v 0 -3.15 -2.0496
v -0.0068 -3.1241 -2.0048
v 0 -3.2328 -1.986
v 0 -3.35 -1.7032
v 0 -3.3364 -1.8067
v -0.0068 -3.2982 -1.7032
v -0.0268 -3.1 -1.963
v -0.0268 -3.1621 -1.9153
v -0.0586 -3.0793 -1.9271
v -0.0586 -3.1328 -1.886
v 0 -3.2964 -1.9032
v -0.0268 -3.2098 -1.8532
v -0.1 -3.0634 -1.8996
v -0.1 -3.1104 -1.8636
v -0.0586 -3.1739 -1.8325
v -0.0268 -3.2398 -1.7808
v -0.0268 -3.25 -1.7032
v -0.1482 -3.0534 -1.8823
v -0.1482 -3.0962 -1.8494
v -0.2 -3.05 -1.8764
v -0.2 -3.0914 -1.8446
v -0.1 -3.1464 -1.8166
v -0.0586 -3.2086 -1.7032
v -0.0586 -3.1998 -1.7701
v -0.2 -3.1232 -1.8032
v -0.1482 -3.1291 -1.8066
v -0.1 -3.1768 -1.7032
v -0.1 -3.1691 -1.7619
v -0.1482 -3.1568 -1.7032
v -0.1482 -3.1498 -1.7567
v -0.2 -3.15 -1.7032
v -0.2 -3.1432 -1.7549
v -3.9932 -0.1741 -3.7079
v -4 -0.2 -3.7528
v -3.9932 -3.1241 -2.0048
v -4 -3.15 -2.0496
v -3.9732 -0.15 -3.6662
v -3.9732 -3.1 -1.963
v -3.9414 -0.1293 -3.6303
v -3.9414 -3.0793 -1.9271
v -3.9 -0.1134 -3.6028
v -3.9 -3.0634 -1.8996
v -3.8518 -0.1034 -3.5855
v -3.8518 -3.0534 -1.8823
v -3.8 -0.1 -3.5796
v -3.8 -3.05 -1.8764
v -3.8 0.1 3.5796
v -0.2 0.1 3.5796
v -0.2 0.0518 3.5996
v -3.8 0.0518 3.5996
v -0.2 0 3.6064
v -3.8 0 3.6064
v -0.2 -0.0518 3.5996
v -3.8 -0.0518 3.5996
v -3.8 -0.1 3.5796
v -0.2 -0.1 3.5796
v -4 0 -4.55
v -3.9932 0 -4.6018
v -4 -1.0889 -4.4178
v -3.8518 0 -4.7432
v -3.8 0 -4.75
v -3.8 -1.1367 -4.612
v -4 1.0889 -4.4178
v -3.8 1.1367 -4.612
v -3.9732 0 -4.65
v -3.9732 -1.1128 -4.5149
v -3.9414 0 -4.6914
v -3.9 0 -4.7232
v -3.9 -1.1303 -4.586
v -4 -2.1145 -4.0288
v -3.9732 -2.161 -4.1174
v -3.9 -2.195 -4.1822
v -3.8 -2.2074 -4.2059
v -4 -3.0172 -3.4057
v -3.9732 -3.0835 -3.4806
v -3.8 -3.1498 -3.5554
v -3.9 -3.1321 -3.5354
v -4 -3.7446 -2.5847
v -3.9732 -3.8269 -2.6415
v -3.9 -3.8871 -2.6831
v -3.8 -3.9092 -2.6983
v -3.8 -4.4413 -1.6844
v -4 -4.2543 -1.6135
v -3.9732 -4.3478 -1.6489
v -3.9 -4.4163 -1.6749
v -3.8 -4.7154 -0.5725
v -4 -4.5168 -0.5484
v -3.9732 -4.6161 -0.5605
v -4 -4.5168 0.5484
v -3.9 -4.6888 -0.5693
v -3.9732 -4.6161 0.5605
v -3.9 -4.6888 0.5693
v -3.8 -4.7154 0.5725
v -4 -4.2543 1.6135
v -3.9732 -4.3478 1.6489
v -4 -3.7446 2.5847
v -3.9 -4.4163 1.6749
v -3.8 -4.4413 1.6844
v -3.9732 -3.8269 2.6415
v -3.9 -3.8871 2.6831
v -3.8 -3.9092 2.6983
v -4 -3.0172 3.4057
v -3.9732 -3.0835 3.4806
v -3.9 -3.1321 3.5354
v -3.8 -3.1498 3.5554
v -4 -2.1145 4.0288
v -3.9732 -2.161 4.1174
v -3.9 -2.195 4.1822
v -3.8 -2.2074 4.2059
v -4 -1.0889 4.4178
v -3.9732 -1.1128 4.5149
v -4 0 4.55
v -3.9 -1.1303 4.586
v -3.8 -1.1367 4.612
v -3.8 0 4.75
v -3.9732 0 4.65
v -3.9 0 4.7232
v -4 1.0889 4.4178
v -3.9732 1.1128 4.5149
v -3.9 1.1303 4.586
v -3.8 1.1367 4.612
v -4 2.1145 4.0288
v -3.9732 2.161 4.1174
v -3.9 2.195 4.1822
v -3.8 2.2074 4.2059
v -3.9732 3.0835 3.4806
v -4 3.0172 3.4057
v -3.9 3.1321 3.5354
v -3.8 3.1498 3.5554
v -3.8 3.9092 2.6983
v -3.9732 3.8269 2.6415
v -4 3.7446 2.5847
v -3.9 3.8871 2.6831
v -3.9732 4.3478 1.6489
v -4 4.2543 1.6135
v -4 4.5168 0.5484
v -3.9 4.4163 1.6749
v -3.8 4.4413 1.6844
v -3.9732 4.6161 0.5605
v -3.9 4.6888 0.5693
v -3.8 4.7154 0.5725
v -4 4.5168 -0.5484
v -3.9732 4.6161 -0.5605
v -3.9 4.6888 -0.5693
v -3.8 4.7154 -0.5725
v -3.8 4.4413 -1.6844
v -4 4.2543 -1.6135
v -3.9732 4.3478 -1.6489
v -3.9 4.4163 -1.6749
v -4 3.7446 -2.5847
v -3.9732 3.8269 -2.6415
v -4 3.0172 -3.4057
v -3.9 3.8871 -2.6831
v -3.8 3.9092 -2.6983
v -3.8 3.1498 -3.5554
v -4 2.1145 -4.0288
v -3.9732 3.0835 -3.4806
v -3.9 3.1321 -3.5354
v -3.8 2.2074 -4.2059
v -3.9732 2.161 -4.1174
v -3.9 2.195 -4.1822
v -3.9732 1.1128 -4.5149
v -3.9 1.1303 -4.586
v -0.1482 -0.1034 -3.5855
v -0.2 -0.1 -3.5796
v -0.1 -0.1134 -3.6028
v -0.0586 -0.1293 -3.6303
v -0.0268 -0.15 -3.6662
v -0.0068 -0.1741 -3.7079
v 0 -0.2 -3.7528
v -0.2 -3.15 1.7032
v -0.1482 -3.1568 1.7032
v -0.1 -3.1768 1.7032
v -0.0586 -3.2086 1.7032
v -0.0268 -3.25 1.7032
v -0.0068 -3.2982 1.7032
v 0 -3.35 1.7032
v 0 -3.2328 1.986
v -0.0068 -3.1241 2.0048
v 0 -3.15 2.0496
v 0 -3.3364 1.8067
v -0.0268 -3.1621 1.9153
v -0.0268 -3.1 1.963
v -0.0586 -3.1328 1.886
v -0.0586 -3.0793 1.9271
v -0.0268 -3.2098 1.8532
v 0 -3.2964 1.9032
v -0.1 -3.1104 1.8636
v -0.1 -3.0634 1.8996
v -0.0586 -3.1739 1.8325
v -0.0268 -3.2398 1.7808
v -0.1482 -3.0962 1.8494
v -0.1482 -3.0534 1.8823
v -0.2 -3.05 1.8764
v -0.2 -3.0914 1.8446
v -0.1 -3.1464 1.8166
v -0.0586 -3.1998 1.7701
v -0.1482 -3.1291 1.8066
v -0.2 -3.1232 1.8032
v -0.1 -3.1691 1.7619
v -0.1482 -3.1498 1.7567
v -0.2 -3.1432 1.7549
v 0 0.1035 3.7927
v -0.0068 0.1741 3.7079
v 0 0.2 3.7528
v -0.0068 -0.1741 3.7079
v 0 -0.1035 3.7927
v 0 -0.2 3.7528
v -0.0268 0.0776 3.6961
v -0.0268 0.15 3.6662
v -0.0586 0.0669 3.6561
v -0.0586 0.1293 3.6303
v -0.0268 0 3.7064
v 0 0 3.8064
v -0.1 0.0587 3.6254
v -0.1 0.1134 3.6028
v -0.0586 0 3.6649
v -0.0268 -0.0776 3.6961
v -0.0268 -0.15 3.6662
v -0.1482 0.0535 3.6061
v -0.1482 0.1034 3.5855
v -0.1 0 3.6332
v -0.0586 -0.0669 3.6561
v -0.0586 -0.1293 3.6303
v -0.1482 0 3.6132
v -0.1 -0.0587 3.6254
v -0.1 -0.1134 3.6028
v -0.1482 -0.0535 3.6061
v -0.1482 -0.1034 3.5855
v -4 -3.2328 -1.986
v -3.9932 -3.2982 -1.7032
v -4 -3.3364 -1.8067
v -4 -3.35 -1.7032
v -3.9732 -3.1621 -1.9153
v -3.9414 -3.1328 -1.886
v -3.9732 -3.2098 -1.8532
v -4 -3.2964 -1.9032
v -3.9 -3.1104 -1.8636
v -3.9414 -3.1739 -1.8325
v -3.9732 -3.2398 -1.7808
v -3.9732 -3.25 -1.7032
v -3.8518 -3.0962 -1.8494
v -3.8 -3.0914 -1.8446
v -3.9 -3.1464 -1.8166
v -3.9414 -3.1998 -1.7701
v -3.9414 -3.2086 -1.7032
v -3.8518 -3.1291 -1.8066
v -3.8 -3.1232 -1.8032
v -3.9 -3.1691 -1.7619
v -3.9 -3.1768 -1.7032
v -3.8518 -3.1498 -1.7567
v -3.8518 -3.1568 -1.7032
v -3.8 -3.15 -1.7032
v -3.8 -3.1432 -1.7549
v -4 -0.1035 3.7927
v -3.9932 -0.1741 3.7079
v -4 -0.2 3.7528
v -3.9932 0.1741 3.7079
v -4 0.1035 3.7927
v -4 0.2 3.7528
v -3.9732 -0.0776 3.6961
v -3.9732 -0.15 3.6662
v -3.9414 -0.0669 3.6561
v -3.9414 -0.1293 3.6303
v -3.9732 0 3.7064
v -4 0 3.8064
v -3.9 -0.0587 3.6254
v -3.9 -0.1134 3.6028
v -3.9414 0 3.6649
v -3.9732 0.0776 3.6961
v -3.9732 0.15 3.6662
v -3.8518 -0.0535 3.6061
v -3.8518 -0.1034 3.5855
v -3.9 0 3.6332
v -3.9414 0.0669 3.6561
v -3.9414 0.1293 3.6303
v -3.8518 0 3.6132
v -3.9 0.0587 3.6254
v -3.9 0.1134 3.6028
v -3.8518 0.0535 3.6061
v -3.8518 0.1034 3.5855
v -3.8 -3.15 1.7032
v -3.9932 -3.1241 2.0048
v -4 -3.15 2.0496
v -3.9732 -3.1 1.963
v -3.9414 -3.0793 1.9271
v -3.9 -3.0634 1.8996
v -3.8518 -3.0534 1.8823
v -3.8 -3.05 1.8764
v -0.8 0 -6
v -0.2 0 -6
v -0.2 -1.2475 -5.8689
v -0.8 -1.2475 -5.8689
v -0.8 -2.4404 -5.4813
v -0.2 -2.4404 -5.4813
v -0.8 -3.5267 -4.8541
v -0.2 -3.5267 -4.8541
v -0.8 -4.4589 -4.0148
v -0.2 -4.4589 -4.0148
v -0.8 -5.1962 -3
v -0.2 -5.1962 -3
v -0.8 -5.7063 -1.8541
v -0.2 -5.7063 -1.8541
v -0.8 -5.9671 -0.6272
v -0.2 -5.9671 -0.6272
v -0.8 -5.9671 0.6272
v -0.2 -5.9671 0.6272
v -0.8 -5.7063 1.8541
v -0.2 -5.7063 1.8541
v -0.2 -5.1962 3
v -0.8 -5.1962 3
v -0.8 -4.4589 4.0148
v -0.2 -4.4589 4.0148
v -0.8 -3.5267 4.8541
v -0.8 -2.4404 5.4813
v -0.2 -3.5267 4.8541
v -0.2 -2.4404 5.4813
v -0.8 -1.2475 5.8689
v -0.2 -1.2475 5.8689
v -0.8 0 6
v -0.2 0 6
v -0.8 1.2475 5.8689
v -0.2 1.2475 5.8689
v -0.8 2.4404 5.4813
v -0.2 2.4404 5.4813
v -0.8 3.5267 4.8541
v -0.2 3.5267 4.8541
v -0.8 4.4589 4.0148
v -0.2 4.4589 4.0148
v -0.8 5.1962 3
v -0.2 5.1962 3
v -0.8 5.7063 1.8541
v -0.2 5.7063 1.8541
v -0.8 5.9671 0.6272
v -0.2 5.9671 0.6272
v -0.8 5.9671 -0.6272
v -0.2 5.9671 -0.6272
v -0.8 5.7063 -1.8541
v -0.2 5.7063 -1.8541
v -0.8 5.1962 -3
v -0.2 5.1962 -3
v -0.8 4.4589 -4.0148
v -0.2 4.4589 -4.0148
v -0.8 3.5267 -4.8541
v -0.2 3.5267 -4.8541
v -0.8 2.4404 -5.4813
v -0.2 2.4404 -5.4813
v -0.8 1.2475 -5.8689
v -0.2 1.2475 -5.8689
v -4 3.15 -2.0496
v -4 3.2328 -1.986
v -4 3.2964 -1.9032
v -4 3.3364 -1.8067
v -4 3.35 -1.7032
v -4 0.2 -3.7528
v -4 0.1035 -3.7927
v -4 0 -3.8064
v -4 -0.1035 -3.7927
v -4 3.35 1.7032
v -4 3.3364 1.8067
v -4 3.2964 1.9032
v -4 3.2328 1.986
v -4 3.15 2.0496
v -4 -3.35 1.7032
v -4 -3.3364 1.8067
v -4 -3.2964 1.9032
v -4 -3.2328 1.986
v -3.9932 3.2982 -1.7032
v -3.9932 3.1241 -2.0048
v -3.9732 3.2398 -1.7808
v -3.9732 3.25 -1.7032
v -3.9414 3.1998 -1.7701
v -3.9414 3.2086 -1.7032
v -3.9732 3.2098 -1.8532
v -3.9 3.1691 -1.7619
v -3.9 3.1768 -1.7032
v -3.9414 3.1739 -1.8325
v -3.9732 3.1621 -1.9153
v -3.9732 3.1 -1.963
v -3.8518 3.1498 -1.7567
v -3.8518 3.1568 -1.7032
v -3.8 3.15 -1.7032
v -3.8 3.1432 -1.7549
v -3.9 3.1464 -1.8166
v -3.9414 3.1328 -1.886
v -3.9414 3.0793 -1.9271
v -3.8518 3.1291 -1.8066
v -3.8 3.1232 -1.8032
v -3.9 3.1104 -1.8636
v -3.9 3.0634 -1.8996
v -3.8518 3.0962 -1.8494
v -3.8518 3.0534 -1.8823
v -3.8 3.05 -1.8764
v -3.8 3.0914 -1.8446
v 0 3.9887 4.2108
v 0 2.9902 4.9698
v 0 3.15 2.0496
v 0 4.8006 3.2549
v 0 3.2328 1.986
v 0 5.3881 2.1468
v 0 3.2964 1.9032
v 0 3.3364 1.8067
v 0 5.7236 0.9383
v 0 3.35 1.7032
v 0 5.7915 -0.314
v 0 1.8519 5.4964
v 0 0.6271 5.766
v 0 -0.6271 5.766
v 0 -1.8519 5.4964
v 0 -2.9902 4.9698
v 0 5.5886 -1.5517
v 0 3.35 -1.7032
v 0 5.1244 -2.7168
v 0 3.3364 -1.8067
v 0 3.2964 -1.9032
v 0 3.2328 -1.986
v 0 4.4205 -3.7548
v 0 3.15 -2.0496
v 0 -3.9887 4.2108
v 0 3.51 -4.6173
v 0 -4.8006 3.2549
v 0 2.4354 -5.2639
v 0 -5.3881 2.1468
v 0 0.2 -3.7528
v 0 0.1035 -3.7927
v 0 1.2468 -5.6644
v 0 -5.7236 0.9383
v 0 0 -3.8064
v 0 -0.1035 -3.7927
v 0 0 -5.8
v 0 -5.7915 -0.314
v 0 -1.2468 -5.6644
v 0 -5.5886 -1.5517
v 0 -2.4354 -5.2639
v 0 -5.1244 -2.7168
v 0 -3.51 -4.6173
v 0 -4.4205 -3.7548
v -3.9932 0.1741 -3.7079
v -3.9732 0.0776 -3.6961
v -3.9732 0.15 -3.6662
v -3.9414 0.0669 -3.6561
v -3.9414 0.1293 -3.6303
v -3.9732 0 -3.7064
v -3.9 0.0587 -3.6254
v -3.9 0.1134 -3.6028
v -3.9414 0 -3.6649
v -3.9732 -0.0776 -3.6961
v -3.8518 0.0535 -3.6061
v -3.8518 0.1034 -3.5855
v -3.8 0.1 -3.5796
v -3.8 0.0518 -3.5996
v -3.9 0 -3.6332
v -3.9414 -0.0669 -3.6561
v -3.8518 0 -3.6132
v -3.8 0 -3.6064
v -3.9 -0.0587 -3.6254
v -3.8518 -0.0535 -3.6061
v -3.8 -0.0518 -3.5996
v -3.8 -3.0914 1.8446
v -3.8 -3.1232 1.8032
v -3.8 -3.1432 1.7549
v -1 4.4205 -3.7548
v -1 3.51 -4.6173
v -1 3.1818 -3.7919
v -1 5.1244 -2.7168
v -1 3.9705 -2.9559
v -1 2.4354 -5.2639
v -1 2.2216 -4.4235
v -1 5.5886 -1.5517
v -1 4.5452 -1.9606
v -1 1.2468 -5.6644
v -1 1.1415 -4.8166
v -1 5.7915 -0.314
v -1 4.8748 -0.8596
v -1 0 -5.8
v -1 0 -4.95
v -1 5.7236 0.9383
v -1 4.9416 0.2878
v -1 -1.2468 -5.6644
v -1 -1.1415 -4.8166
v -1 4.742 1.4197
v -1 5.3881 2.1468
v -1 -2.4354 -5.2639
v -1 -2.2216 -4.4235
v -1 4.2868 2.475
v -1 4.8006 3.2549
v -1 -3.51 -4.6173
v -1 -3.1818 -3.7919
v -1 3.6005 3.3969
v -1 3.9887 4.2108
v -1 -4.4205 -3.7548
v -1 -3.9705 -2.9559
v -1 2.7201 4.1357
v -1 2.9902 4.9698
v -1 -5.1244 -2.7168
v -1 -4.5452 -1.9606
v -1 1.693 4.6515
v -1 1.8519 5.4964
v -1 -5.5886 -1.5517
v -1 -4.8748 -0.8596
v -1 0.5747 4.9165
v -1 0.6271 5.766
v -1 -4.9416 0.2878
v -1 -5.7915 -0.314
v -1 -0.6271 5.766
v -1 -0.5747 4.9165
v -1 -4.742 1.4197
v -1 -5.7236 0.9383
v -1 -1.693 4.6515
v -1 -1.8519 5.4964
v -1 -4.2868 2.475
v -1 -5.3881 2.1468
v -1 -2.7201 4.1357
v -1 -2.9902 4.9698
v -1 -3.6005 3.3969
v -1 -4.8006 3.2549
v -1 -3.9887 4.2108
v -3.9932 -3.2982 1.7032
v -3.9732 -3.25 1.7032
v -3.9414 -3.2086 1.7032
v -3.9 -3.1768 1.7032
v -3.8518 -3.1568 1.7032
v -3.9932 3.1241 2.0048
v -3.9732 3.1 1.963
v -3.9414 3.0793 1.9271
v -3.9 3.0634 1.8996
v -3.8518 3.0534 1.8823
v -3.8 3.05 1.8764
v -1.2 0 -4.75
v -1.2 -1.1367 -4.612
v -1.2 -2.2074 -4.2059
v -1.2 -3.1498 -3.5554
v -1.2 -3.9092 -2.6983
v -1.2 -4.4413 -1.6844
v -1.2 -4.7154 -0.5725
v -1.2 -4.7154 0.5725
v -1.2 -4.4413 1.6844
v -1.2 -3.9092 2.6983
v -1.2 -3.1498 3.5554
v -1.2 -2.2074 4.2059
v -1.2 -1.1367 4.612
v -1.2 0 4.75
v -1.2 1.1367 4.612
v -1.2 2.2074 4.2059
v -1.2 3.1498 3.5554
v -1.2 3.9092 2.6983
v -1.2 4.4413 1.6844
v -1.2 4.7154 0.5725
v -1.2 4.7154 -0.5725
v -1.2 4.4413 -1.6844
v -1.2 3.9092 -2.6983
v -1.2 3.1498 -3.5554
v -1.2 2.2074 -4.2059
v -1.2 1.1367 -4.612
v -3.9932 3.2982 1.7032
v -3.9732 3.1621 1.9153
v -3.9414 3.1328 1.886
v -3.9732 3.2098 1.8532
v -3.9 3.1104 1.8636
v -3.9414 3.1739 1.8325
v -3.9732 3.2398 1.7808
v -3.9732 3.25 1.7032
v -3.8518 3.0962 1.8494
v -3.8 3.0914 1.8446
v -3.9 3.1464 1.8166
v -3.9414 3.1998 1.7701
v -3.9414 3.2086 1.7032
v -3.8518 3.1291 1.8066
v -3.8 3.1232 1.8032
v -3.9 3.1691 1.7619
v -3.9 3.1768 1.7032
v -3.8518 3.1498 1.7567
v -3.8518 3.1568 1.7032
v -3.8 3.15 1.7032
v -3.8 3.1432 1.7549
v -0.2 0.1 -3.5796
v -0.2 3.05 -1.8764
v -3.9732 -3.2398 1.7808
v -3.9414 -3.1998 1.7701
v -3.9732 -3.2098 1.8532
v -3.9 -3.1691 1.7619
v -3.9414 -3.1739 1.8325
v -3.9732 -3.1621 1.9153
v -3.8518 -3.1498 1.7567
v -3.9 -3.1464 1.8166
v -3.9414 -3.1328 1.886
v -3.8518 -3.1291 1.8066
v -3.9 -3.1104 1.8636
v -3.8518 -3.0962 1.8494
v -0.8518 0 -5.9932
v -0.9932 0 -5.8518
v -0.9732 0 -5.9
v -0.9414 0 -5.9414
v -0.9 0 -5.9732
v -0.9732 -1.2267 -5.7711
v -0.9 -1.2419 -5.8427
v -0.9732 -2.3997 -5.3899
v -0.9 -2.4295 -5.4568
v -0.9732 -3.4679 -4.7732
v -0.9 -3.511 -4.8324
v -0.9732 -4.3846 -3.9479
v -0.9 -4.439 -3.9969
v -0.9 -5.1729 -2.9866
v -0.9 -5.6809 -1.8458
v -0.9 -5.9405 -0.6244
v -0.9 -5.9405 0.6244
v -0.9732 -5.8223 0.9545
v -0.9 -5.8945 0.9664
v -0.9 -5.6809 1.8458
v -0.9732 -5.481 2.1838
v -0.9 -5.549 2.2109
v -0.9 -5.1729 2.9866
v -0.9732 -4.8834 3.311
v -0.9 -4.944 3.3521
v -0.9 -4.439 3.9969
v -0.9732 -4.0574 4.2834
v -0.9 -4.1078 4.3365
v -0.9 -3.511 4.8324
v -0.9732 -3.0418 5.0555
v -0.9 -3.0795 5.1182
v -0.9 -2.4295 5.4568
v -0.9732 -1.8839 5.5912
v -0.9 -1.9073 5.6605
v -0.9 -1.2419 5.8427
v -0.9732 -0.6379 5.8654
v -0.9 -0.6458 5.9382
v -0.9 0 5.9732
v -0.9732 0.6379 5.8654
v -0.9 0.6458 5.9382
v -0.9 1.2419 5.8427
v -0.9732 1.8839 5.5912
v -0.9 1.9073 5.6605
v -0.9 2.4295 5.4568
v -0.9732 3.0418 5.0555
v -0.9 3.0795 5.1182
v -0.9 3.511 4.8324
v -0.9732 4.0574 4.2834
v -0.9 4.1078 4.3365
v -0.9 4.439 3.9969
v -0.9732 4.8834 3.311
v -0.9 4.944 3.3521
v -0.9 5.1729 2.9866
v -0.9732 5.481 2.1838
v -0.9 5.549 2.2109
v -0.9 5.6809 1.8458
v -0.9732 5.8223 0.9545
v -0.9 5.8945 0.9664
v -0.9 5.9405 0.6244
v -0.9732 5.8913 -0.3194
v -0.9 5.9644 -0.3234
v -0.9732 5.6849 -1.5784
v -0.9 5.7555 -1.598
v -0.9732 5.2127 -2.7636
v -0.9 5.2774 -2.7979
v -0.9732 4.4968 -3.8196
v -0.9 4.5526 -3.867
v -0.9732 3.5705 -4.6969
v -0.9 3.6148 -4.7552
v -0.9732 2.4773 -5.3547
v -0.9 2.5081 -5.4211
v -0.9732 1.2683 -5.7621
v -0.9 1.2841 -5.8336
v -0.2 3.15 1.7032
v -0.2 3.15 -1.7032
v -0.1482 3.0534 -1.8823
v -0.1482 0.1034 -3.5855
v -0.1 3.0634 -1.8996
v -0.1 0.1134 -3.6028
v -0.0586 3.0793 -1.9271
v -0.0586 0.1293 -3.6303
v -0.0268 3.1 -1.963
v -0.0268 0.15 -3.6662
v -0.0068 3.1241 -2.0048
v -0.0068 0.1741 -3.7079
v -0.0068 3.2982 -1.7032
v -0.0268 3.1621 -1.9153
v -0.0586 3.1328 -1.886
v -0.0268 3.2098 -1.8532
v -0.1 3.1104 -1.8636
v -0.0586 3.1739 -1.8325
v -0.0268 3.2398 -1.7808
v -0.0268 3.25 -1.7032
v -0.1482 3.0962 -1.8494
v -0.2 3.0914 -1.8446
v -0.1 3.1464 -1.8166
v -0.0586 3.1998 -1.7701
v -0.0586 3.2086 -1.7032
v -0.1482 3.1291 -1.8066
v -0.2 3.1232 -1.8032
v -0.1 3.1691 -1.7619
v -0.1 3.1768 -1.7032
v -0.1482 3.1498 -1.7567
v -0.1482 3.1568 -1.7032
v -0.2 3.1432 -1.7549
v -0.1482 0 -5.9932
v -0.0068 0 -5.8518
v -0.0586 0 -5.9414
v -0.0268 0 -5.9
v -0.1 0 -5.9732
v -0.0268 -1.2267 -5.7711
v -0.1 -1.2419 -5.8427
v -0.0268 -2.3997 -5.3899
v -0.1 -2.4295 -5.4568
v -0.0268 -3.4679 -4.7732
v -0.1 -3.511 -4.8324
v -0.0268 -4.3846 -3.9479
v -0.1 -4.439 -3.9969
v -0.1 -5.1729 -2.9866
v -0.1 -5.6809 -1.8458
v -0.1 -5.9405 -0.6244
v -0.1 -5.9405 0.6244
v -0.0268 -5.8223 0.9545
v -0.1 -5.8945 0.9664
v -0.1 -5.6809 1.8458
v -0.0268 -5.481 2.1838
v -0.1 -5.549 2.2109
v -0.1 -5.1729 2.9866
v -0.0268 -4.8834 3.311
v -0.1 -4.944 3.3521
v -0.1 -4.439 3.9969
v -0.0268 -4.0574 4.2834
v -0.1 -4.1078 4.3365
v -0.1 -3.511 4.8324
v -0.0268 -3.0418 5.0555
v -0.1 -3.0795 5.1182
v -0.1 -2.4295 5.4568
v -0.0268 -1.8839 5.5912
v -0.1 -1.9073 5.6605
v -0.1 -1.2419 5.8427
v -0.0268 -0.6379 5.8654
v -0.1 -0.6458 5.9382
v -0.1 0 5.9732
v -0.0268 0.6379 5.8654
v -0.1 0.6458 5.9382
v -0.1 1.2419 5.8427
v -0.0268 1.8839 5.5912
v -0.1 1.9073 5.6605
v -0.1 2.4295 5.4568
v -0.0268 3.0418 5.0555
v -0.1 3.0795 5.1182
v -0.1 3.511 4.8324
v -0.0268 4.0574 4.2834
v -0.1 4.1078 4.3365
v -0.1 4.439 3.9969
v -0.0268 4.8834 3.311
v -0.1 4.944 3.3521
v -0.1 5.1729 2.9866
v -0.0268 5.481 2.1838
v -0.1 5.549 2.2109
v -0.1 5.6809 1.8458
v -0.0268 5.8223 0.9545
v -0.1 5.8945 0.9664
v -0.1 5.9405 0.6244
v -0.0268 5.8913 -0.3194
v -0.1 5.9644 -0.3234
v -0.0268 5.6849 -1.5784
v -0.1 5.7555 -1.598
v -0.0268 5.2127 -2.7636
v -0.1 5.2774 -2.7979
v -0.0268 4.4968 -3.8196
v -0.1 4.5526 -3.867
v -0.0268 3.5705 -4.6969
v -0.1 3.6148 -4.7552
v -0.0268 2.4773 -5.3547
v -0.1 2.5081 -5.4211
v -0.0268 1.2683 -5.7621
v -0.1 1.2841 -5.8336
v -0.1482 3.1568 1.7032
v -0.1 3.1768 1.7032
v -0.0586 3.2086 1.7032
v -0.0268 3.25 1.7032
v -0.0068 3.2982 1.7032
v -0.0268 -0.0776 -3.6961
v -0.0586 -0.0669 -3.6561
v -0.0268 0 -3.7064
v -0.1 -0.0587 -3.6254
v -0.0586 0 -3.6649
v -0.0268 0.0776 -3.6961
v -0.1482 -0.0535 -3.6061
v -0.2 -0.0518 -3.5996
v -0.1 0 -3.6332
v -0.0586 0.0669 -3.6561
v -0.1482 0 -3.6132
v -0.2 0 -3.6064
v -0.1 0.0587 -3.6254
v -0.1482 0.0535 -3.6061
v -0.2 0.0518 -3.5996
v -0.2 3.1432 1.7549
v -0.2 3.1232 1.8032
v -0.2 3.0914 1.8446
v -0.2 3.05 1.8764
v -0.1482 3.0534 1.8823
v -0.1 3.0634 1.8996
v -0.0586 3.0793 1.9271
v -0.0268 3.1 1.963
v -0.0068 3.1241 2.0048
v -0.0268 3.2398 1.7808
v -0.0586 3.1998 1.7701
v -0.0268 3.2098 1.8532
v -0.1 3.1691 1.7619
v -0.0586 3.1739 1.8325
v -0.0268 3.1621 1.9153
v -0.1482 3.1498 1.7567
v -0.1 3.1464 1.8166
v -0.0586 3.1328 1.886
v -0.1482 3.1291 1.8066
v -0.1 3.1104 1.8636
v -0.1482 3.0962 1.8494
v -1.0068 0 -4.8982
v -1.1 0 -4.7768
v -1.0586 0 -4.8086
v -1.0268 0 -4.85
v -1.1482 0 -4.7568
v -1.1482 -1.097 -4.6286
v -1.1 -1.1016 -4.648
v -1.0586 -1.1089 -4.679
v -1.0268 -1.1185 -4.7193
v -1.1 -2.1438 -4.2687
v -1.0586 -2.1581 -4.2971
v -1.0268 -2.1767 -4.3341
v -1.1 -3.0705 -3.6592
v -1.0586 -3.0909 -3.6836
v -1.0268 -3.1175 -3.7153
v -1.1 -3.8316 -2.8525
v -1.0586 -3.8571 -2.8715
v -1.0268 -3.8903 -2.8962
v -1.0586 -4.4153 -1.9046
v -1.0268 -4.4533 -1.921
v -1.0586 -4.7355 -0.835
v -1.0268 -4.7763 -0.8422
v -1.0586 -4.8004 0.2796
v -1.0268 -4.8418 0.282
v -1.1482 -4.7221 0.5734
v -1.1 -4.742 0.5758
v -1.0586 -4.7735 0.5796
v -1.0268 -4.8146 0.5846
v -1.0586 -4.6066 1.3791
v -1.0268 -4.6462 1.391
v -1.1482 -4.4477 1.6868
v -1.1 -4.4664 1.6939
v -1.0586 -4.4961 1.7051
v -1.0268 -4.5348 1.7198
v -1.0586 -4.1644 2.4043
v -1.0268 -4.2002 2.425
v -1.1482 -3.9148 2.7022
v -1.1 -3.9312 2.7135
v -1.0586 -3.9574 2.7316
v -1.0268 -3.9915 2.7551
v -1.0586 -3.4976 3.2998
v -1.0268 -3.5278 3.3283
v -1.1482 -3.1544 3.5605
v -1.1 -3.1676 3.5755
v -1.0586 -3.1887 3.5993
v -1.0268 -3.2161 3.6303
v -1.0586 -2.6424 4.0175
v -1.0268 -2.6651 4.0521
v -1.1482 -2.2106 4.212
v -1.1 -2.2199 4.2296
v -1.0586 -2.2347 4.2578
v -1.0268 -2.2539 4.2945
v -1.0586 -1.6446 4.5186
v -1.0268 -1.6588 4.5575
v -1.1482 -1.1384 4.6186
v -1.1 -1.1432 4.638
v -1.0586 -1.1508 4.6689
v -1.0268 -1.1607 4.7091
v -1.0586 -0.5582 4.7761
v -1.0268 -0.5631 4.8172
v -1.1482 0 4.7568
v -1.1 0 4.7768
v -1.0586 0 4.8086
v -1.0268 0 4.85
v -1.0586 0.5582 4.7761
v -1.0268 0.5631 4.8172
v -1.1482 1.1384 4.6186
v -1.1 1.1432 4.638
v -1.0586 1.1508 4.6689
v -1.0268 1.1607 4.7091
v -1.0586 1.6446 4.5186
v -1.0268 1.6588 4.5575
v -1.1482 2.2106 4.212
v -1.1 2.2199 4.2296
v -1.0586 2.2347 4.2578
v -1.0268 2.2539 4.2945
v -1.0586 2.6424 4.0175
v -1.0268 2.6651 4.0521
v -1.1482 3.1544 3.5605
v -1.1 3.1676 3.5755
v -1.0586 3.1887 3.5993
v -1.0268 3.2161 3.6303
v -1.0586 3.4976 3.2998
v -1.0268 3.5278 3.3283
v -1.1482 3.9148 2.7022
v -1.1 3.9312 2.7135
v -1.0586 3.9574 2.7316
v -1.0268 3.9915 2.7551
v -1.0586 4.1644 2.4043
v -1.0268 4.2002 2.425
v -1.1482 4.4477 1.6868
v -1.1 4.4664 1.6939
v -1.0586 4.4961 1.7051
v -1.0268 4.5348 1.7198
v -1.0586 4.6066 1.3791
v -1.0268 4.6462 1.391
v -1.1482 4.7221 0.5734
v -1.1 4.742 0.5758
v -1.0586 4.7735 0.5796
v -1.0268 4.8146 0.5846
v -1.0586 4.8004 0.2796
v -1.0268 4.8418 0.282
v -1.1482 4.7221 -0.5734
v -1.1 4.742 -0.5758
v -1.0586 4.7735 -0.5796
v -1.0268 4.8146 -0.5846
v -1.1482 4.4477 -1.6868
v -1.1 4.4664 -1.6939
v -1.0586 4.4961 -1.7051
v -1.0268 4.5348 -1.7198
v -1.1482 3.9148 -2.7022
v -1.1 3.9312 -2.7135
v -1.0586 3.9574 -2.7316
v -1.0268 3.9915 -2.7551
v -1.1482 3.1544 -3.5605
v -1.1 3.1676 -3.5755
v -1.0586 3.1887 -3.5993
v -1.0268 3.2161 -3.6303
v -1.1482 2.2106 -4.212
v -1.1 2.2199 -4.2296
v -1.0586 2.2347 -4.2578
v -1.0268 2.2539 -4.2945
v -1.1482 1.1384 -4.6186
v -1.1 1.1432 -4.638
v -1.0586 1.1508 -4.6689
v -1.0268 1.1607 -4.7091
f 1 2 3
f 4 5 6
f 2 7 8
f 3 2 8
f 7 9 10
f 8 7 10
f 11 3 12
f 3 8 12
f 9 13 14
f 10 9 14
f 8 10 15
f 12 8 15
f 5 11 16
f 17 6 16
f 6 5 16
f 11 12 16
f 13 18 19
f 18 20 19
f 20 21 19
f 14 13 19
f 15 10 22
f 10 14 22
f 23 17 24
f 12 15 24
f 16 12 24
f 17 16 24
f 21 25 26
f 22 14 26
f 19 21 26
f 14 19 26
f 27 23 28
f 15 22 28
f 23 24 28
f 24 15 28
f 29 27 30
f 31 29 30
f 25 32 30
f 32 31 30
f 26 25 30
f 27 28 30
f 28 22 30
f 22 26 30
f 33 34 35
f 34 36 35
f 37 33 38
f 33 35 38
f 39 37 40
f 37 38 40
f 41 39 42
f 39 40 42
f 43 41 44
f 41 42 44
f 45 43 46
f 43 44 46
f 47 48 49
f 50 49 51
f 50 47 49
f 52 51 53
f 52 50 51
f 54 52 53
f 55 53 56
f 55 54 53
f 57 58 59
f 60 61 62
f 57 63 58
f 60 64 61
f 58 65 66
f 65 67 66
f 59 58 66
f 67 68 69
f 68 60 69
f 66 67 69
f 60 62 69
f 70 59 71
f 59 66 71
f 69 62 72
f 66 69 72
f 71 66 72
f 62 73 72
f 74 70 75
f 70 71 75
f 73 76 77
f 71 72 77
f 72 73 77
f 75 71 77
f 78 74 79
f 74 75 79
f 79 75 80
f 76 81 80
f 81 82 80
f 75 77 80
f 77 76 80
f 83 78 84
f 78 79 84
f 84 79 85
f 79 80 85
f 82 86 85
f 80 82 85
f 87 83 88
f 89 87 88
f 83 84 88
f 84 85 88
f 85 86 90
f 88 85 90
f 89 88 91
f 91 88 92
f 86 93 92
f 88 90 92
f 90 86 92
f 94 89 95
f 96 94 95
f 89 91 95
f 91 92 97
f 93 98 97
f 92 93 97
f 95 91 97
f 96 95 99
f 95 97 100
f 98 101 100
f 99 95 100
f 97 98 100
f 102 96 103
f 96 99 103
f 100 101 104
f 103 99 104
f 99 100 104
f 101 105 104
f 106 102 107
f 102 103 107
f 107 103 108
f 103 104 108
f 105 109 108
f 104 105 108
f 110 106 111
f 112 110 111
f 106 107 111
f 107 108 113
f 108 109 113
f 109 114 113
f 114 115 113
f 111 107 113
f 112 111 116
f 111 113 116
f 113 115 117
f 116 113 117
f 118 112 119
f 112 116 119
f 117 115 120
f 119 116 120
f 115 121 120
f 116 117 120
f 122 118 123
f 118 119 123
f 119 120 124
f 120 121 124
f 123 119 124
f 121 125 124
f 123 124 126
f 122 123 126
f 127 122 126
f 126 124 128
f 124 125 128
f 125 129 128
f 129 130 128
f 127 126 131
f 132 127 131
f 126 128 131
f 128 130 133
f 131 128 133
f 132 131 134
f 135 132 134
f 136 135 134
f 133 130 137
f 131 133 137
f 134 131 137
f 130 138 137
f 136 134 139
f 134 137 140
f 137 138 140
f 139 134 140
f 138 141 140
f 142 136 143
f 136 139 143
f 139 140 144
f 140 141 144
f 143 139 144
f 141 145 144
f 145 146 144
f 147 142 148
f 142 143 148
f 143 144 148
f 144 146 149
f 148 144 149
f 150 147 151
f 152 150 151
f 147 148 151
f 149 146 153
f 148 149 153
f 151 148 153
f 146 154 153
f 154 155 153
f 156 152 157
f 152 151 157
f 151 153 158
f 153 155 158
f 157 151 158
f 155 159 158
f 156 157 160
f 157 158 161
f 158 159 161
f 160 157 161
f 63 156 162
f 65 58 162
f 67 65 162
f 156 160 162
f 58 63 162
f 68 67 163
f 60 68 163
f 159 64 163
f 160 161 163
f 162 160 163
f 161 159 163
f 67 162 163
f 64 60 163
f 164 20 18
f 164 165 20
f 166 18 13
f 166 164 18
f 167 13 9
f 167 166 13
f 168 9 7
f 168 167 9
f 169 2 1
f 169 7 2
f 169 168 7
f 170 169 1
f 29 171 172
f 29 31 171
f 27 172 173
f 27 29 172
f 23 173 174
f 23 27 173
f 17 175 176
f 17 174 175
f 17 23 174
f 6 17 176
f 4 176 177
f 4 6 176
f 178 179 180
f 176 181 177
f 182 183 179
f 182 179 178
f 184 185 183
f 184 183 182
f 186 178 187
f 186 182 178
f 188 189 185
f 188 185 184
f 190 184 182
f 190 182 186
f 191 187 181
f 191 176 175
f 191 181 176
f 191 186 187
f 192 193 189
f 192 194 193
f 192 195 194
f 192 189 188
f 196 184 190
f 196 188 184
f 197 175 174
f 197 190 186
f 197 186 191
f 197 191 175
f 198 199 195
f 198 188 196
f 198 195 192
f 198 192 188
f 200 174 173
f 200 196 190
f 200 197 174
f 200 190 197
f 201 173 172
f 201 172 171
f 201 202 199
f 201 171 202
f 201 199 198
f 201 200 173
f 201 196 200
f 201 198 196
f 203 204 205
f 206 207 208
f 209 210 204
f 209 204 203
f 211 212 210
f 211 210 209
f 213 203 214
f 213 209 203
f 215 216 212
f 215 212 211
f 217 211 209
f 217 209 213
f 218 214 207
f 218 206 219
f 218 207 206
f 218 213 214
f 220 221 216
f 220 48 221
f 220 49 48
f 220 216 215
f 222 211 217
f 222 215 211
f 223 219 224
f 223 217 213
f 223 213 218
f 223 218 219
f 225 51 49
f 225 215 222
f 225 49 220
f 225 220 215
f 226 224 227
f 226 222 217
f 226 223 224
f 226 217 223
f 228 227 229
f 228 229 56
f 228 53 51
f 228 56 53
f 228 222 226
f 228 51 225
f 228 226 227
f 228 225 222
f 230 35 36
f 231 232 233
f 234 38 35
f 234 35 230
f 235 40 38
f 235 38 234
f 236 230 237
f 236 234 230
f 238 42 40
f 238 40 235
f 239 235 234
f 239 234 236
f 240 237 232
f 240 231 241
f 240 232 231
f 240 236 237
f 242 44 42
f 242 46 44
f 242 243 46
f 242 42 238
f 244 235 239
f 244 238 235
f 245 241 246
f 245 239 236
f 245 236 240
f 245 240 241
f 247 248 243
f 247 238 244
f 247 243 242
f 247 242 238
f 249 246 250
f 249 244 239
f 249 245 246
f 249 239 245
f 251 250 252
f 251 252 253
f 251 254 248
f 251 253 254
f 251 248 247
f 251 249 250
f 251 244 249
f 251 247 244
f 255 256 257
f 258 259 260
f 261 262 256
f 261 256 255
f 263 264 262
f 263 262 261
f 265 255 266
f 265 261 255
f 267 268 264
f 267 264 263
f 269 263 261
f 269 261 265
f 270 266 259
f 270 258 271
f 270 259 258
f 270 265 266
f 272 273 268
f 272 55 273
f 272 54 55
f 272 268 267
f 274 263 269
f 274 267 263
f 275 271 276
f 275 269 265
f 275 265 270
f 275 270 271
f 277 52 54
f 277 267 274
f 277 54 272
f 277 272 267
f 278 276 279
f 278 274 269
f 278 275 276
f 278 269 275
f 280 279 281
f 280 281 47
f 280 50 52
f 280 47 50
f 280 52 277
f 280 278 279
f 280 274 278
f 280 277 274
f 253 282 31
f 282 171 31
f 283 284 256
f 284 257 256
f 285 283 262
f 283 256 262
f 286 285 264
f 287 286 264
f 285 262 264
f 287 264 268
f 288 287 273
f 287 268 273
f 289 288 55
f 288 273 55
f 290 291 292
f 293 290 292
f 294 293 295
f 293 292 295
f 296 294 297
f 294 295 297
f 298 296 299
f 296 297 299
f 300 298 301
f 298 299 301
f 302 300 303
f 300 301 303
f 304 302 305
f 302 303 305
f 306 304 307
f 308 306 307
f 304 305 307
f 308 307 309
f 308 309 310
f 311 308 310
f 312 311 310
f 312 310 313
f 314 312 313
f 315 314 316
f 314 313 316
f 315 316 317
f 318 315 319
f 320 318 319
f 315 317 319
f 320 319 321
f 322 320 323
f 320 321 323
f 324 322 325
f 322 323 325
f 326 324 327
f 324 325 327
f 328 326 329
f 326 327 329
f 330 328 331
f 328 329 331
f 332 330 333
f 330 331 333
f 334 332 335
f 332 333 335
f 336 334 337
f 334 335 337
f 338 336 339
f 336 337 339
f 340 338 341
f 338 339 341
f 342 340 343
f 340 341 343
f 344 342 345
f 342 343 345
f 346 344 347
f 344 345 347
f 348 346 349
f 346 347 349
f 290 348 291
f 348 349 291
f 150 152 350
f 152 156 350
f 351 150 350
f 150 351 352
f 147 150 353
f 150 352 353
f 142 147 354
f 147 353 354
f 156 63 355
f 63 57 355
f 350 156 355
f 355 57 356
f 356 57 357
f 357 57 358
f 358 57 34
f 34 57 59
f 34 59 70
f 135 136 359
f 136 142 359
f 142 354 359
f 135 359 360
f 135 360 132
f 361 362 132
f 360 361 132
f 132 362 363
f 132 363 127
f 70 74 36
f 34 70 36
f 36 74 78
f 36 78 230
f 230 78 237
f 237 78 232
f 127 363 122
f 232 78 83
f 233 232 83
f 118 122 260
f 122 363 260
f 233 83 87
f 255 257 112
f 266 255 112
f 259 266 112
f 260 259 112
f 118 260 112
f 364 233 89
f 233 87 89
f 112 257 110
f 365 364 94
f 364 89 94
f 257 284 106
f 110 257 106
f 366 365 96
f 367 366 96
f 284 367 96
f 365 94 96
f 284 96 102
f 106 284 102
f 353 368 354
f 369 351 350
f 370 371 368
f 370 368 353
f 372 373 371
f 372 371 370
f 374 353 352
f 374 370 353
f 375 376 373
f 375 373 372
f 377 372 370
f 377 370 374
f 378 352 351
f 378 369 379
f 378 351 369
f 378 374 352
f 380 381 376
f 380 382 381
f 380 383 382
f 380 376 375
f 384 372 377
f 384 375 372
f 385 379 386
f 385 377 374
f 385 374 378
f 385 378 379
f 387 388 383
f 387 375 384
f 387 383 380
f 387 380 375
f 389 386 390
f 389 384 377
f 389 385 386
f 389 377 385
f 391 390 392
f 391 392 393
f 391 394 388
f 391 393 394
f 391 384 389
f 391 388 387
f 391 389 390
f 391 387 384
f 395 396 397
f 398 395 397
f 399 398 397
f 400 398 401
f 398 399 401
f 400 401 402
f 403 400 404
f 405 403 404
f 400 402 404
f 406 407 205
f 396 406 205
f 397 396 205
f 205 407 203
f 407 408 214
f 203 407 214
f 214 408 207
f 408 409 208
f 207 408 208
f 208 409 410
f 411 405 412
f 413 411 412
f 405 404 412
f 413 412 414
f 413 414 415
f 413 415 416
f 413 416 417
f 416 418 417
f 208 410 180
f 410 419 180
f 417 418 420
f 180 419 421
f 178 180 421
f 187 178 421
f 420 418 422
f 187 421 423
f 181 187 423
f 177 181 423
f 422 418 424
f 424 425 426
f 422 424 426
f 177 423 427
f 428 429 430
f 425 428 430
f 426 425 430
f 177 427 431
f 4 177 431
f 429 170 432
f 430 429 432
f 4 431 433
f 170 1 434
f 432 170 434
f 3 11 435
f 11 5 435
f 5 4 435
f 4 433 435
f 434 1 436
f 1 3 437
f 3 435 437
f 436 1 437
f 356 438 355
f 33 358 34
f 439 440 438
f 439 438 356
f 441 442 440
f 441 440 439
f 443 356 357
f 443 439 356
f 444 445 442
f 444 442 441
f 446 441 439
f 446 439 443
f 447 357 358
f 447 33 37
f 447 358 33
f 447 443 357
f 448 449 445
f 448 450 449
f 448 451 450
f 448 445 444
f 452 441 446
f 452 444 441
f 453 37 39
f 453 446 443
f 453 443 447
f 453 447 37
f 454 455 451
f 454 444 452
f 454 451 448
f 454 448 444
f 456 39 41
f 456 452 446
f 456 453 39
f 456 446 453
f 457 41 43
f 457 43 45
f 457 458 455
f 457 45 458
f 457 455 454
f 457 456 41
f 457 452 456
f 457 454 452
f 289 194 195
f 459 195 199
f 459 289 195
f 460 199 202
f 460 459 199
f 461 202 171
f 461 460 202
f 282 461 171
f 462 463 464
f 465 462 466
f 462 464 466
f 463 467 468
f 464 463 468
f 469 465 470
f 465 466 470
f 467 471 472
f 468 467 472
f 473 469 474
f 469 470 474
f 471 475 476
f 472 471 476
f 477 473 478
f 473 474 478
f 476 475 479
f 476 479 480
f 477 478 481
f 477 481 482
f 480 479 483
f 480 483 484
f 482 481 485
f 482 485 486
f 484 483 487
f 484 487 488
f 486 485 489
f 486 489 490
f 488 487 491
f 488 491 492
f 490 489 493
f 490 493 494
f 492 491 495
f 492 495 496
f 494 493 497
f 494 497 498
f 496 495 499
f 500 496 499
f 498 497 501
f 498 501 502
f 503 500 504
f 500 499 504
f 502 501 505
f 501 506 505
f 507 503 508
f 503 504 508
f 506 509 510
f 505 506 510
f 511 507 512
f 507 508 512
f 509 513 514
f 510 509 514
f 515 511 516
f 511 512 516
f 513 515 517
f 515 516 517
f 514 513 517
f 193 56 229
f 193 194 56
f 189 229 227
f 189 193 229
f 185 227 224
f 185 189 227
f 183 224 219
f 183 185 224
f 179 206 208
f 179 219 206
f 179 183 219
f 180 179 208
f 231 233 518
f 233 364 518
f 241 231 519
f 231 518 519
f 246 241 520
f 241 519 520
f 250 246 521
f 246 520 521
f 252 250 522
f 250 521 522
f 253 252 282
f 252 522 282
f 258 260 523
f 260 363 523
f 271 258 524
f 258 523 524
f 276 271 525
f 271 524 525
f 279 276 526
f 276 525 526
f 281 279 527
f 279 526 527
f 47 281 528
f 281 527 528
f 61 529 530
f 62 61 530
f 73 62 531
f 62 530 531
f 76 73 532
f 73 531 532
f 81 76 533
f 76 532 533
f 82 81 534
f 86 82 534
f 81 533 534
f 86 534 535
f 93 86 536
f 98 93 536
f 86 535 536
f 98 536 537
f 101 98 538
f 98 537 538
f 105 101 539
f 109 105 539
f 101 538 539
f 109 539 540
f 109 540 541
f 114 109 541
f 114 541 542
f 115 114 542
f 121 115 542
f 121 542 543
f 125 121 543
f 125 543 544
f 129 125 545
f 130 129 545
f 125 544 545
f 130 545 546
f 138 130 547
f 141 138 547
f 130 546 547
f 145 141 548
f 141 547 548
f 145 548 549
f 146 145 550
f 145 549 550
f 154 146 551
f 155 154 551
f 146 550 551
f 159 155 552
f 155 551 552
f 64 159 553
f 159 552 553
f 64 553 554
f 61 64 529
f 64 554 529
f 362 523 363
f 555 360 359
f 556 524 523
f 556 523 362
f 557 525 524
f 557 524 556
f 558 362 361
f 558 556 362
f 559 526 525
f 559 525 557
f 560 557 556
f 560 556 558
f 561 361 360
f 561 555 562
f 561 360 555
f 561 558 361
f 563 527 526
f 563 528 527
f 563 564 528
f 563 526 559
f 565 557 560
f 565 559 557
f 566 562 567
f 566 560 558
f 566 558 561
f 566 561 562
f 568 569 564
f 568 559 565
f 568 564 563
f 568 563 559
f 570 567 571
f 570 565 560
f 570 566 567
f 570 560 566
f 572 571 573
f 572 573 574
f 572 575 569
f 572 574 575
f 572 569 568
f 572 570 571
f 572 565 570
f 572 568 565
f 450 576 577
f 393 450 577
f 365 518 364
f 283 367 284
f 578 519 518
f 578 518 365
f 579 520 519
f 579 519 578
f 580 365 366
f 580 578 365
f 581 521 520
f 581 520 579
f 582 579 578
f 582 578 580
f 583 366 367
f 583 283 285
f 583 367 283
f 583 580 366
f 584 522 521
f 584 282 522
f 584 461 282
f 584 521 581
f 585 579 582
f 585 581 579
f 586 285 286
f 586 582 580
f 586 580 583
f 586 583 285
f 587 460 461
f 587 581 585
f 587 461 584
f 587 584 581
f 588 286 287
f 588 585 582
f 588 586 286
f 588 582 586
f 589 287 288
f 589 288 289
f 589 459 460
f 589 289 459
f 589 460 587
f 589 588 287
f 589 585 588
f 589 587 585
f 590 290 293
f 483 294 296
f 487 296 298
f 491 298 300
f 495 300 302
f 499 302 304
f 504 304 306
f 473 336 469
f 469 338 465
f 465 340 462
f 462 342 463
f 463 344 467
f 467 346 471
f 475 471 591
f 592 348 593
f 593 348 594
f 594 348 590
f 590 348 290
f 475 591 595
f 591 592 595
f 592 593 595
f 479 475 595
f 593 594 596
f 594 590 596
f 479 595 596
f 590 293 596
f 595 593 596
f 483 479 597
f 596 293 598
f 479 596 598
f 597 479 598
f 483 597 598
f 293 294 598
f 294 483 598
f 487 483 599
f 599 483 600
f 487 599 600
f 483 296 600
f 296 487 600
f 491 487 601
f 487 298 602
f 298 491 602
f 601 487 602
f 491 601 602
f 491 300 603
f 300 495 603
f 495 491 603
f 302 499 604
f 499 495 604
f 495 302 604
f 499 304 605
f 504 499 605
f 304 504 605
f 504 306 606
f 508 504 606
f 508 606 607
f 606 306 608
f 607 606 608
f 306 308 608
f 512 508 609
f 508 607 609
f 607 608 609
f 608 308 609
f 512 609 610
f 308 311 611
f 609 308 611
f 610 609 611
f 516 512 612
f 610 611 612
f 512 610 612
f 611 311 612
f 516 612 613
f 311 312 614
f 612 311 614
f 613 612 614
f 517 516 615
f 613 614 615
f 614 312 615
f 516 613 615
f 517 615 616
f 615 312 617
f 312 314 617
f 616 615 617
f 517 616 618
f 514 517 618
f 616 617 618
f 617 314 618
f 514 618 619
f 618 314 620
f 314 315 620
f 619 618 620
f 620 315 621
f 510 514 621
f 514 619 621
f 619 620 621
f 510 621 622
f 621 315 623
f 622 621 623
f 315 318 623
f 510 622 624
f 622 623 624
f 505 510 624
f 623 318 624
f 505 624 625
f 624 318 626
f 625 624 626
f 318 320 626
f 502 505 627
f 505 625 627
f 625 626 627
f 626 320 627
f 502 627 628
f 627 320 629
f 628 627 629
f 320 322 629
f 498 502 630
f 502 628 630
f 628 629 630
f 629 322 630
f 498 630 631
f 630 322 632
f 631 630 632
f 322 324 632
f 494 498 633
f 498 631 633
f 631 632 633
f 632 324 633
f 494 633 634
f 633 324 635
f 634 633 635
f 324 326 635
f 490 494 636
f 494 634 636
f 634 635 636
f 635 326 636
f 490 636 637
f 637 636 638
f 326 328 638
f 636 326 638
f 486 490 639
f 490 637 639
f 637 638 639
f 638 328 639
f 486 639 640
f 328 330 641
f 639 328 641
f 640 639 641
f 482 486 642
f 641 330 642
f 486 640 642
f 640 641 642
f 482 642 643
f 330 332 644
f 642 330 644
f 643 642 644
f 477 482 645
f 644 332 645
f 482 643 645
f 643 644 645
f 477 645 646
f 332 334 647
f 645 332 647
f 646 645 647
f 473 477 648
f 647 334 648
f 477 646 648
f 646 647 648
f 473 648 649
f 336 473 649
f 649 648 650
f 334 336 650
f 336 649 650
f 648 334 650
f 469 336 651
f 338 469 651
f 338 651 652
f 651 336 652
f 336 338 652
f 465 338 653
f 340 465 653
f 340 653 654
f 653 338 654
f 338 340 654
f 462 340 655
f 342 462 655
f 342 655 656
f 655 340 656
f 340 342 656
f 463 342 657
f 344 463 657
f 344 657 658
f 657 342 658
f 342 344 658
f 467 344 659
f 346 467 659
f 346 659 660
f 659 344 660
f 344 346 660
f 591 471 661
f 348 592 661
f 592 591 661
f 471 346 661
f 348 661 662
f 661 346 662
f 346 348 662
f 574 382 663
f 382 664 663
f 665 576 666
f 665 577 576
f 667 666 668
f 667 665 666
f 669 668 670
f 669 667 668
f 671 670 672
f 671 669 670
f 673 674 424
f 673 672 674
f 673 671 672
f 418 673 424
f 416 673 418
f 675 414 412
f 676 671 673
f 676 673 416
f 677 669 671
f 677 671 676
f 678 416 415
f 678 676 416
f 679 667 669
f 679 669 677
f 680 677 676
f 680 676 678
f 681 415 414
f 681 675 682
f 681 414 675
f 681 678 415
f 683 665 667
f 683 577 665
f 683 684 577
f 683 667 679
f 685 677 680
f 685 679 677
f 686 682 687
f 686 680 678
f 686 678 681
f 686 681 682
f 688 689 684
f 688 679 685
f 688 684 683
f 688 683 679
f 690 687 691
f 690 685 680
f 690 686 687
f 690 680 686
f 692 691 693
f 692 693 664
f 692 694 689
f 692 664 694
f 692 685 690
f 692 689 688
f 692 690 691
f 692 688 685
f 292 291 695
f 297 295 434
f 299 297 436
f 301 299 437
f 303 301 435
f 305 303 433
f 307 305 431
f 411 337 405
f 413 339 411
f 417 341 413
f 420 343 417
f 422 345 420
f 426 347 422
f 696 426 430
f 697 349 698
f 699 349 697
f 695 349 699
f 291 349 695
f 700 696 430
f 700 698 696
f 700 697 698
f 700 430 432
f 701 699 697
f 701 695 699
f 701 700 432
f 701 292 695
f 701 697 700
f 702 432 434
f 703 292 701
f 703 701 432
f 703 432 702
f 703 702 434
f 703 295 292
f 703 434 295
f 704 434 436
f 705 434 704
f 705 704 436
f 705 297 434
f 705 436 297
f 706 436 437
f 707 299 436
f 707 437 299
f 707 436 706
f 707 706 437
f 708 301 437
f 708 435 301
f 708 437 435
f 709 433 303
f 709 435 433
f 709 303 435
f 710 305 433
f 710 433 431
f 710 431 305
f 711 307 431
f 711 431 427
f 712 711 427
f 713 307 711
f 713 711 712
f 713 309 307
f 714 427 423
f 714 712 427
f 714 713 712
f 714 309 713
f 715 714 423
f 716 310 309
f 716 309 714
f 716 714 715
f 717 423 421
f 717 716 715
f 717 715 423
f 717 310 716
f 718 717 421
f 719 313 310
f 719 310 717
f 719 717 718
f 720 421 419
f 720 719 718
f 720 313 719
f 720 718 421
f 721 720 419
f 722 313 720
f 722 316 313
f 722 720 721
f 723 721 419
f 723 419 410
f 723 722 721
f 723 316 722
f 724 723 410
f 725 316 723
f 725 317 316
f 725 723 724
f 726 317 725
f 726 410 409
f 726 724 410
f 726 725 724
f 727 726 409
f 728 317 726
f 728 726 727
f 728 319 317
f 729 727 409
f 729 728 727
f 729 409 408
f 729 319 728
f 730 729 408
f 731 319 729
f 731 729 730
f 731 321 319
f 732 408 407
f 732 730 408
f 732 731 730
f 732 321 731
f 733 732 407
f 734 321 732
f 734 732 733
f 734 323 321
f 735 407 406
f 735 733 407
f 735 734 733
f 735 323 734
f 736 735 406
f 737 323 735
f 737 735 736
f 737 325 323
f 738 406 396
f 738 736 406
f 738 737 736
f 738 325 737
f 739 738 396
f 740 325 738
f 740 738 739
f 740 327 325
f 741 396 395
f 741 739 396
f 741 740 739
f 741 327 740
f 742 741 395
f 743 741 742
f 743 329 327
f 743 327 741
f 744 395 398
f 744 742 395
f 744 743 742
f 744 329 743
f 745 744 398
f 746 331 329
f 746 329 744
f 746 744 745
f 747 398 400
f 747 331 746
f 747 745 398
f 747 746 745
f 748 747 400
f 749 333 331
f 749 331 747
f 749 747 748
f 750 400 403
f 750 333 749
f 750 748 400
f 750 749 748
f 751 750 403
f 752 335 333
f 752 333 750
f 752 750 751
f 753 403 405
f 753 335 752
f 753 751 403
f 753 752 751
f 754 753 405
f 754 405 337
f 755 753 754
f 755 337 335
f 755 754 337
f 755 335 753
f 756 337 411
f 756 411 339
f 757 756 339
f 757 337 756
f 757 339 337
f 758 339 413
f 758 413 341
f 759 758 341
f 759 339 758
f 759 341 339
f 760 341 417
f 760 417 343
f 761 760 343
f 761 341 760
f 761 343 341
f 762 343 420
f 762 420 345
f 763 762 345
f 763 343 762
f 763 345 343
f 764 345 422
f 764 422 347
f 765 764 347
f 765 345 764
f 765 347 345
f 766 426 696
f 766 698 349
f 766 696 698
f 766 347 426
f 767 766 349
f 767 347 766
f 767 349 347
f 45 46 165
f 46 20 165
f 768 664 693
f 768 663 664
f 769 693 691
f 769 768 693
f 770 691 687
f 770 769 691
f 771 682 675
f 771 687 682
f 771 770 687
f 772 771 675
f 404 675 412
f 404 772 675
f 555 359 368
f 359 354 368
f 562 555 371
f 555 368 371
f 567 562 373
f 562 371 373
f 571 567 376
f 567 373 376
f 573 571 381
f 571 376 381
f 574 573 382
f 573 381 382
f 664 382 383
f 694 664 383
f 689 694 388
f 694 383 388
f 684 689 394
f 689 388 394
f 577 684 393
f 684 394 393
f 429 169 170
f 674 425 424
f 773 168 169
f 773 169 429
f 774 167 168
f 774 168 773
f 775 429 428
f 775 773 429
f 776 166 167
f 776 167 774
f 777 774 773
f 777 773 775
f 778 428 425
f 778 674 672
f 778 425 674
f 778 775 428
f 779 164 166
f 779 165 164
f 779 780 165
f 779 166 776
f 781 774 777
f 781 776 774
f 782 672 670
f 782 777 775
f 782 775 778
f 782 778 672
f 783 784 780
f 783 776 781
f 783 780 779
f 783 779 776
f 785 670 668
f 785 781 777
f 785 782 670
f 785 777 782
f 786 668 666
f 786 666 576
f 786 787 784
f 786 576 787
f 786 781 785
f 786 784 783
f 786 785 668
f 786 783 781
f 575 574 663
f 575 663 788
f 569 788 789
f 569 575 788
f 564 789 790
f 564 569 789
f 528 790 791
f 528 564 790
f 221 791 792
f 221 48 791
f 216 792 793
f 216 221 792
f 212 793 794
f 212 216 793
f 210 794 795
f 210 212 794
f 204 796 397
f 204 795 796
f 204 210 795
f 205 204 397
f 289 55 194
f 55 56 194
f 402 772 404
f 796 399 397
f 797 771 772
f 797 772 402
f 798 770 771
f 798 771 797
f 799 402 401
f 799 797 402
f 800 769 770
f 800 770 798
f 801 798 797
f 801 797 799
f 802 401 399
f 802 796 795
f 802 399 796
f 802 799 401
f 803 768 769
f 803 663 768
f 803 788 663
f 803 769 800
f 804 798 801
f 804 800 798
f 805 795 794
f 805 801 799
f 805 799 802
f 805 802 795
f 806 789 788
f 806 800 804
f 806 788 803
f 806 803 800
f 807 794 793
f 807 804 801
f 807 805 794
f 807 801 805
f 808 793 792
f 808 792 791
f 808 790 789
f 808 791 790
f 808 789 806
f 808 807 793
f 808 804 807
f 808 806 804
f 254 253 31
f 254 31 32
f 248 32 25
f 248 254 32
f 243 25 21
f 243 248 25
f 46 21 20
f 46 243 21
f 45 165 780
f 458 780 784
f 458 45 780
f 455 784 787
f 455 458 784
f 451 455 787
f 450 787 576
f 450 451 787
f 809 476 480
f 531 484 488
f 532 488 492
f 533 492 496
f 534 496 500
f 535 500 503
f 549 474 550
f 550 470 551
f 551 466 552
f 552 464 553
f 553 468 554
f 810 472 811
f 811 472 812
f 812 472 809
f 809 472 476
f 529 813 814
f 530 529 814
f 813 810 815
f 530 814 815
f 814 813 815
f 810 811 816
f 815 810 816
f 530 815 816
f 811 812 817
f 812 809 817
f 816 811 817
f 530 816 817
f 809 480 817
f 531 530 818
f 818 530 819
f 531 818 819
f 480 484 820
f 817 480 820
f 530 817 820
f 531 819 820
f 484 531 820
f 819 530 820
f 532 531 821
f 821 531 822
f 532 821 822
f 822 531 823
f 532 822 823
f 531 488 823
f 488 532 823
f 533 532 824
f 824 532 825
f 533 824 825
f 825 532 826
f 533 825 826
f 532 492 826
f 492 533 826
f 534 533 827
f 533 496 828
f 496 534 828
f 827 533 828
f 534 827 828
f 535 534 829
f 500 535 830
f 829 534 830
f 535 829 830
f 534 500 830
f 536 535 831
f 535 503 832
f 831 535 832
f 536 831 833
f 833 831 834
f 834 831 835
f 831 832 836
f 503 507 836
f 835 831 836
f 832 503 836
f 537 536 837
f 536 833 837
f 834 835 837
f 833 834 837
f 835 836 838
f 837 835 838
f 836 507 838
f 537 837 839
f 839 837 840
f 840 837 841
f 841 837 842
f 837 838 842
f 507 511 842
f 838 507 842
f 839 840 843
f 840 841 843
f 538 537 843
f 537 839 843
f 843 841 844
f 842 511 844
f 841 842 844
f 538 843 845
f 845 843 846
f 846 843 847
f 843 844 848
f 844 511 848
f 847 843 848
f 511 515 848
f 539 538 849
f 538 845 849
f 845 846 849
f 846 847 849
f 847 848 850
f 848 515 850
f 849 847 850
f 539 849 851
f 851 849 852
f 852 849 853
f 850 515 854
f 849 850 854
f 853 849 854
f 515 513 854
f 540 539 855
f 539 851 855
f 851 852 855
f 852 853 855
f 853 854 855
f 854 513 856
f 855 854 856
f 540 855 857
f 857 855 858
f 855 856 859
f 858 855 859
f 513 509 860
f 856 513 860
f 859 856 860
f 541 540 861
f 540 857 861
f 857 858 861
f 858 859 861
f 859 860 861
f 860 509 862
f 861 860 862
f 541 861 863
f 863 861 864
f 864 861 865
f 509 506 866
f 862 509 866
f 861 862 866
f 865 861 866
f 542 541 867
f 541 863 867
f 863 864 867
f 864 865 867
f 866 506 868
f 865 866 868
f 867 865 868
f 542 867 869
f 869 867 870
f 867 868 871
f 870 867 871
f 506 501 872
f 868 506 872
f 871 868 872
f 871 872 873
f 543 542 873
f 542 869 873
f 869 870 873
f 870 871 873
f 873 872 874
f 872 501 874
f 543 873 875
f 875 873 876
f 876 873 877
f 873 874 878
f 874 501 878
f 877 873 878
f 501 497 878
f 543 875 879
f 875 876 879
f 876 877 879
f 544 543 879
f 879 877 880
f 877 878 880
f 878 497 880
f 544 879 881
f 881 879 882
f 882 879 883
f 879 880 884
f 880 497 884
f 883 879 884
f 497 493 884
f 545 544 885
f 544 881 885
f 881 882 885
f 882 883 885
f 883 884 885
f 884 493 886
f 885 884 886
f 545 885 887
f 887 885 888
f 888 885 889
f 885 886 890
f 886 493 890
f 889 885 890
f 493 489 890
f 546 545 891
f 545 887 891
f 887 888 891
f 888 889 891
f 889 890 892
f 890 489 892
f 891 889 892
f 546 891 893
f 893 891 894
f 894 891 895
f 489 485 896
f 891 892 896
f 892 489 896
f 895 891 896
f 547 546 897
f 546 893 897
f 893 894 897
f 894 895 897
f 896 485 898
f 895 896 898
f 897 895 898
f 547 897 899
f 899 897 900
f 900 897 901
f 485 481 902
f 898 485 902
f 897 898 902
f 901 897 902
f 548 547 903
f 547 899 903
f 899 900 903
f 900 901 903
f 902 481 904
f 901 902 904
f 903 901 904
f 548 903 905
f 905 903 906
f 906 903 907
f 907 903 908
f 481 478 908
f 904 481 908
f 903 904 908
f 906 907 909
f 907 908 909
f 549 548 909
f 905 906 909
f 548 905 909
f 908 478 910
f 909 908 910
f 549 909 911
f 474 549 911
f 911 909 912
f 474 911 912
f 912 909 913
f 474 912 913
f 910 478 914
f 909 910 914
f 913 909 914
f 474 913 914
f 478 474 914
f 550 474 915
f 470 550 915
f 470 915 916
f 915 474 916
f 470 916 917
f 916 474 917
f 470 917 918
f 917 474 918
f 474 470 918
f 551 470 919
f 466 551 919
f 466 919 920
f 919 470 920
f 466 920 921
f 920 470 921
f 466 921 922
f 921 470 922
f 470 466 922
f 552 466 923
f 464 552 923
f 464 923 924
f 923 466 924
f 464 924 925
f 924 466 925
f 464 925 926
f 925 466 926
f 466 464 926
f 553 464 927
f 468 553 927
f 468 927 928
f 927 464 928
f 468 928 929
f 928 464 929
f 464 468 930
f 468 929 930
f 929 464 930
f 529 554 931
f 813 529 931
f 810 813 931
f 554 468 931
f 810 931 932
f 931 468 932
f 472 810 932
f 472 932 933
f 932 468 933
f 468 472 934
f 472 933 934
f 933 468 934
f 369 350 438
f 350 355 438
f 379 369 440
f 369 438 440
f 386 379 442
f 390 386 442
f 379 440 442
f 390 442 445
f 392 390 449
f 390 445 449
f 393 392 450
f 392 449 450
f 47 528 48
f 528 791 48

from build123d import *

# Parameters (mm, degrees)
CUT_EXTRUDE1_REACH = 11.381
FILLET1_R          = 0.2


with BuildPart() as part:
    # Sketch1 → Revolve1 (revolve)
    with BuildSketch(Plane.XY, mode=Mode.PRIVATE) as revolve1_sk:
        Polygon((-4, 0), (-4, 4.75), (-1, 4.75), (-1, 6), (0, 6), (0, 0), align=None)
    revolve(revolve1_sk.sketch.rotate(Axis((0, 0, 0), (-1, 0, 0)), 90), axis=Axis((0, 0, 0), (-1, 0, 0)))

    # Sketch2 → Cut-Extrude1 (cut, up to next)
    with BuildSketch(Plane(origin=(0, 0, 0), x_dir=(0, 0, -1), z_dir=(1, 0, 0)), mode=Mode.PRIVATE) as cut_extrude1_sk1:
        Polygon((3.637306696, 0), (1.818653348, 3.15), (-1.818653348, 3.15), (-3.637306696, 0), (-1.818653348, -3.15), (1.818653348, -3.15), align=None)
    cut_extrude1_tool1 = extrude(cut_extrude1_sk1.sketch, amount=-CUT_EXTRUDE1_REACH, mode=Mode.PRIVATE) & part.part
    add(cut_extrude1_tool1.solids().sort_by_distance((0, 0, 0))[0], mode=Mode.SUBTRACT)

    # Fillet1
    fillet1_edges = [part.edges().sort_by_distance(p)[0] for p in [
        (-4, -1.575, -2.727980022),
        (-2, 0, -3.637306696),
        (-4, -3.15, 0),
        (-2, -3.15, -1.818653348),
        (-4, -1.575, 2.727980022),
        (-2, -3.15, 1.818653348),
        (-4, 1.575, 2.727980022),
        (-2, 0, 3.637306696),
        (-4, 3.15, 0),
        (-2, 3.15, 1.818653348),
        (-4, 1.575, -2.727980022),
        (-2, 3.15, -1.818653348),
        (0, -1.575, -2.727980022),
        (0, 1.575, -2.727980022),
        (0, 3.15, 0),
        (0, 1.575, 2.727980022),
        (0, -1.575, 2.727980022),
        (0, -3.15, 0),
        (0, 0, 6),
        (-1, 0, 6),
        (-1, 0, 4.75),
        (-4, 0, 4.75),
    ]]
    fillet(fillet1_edges, radius=FILLET1_R)


solid = part.part
